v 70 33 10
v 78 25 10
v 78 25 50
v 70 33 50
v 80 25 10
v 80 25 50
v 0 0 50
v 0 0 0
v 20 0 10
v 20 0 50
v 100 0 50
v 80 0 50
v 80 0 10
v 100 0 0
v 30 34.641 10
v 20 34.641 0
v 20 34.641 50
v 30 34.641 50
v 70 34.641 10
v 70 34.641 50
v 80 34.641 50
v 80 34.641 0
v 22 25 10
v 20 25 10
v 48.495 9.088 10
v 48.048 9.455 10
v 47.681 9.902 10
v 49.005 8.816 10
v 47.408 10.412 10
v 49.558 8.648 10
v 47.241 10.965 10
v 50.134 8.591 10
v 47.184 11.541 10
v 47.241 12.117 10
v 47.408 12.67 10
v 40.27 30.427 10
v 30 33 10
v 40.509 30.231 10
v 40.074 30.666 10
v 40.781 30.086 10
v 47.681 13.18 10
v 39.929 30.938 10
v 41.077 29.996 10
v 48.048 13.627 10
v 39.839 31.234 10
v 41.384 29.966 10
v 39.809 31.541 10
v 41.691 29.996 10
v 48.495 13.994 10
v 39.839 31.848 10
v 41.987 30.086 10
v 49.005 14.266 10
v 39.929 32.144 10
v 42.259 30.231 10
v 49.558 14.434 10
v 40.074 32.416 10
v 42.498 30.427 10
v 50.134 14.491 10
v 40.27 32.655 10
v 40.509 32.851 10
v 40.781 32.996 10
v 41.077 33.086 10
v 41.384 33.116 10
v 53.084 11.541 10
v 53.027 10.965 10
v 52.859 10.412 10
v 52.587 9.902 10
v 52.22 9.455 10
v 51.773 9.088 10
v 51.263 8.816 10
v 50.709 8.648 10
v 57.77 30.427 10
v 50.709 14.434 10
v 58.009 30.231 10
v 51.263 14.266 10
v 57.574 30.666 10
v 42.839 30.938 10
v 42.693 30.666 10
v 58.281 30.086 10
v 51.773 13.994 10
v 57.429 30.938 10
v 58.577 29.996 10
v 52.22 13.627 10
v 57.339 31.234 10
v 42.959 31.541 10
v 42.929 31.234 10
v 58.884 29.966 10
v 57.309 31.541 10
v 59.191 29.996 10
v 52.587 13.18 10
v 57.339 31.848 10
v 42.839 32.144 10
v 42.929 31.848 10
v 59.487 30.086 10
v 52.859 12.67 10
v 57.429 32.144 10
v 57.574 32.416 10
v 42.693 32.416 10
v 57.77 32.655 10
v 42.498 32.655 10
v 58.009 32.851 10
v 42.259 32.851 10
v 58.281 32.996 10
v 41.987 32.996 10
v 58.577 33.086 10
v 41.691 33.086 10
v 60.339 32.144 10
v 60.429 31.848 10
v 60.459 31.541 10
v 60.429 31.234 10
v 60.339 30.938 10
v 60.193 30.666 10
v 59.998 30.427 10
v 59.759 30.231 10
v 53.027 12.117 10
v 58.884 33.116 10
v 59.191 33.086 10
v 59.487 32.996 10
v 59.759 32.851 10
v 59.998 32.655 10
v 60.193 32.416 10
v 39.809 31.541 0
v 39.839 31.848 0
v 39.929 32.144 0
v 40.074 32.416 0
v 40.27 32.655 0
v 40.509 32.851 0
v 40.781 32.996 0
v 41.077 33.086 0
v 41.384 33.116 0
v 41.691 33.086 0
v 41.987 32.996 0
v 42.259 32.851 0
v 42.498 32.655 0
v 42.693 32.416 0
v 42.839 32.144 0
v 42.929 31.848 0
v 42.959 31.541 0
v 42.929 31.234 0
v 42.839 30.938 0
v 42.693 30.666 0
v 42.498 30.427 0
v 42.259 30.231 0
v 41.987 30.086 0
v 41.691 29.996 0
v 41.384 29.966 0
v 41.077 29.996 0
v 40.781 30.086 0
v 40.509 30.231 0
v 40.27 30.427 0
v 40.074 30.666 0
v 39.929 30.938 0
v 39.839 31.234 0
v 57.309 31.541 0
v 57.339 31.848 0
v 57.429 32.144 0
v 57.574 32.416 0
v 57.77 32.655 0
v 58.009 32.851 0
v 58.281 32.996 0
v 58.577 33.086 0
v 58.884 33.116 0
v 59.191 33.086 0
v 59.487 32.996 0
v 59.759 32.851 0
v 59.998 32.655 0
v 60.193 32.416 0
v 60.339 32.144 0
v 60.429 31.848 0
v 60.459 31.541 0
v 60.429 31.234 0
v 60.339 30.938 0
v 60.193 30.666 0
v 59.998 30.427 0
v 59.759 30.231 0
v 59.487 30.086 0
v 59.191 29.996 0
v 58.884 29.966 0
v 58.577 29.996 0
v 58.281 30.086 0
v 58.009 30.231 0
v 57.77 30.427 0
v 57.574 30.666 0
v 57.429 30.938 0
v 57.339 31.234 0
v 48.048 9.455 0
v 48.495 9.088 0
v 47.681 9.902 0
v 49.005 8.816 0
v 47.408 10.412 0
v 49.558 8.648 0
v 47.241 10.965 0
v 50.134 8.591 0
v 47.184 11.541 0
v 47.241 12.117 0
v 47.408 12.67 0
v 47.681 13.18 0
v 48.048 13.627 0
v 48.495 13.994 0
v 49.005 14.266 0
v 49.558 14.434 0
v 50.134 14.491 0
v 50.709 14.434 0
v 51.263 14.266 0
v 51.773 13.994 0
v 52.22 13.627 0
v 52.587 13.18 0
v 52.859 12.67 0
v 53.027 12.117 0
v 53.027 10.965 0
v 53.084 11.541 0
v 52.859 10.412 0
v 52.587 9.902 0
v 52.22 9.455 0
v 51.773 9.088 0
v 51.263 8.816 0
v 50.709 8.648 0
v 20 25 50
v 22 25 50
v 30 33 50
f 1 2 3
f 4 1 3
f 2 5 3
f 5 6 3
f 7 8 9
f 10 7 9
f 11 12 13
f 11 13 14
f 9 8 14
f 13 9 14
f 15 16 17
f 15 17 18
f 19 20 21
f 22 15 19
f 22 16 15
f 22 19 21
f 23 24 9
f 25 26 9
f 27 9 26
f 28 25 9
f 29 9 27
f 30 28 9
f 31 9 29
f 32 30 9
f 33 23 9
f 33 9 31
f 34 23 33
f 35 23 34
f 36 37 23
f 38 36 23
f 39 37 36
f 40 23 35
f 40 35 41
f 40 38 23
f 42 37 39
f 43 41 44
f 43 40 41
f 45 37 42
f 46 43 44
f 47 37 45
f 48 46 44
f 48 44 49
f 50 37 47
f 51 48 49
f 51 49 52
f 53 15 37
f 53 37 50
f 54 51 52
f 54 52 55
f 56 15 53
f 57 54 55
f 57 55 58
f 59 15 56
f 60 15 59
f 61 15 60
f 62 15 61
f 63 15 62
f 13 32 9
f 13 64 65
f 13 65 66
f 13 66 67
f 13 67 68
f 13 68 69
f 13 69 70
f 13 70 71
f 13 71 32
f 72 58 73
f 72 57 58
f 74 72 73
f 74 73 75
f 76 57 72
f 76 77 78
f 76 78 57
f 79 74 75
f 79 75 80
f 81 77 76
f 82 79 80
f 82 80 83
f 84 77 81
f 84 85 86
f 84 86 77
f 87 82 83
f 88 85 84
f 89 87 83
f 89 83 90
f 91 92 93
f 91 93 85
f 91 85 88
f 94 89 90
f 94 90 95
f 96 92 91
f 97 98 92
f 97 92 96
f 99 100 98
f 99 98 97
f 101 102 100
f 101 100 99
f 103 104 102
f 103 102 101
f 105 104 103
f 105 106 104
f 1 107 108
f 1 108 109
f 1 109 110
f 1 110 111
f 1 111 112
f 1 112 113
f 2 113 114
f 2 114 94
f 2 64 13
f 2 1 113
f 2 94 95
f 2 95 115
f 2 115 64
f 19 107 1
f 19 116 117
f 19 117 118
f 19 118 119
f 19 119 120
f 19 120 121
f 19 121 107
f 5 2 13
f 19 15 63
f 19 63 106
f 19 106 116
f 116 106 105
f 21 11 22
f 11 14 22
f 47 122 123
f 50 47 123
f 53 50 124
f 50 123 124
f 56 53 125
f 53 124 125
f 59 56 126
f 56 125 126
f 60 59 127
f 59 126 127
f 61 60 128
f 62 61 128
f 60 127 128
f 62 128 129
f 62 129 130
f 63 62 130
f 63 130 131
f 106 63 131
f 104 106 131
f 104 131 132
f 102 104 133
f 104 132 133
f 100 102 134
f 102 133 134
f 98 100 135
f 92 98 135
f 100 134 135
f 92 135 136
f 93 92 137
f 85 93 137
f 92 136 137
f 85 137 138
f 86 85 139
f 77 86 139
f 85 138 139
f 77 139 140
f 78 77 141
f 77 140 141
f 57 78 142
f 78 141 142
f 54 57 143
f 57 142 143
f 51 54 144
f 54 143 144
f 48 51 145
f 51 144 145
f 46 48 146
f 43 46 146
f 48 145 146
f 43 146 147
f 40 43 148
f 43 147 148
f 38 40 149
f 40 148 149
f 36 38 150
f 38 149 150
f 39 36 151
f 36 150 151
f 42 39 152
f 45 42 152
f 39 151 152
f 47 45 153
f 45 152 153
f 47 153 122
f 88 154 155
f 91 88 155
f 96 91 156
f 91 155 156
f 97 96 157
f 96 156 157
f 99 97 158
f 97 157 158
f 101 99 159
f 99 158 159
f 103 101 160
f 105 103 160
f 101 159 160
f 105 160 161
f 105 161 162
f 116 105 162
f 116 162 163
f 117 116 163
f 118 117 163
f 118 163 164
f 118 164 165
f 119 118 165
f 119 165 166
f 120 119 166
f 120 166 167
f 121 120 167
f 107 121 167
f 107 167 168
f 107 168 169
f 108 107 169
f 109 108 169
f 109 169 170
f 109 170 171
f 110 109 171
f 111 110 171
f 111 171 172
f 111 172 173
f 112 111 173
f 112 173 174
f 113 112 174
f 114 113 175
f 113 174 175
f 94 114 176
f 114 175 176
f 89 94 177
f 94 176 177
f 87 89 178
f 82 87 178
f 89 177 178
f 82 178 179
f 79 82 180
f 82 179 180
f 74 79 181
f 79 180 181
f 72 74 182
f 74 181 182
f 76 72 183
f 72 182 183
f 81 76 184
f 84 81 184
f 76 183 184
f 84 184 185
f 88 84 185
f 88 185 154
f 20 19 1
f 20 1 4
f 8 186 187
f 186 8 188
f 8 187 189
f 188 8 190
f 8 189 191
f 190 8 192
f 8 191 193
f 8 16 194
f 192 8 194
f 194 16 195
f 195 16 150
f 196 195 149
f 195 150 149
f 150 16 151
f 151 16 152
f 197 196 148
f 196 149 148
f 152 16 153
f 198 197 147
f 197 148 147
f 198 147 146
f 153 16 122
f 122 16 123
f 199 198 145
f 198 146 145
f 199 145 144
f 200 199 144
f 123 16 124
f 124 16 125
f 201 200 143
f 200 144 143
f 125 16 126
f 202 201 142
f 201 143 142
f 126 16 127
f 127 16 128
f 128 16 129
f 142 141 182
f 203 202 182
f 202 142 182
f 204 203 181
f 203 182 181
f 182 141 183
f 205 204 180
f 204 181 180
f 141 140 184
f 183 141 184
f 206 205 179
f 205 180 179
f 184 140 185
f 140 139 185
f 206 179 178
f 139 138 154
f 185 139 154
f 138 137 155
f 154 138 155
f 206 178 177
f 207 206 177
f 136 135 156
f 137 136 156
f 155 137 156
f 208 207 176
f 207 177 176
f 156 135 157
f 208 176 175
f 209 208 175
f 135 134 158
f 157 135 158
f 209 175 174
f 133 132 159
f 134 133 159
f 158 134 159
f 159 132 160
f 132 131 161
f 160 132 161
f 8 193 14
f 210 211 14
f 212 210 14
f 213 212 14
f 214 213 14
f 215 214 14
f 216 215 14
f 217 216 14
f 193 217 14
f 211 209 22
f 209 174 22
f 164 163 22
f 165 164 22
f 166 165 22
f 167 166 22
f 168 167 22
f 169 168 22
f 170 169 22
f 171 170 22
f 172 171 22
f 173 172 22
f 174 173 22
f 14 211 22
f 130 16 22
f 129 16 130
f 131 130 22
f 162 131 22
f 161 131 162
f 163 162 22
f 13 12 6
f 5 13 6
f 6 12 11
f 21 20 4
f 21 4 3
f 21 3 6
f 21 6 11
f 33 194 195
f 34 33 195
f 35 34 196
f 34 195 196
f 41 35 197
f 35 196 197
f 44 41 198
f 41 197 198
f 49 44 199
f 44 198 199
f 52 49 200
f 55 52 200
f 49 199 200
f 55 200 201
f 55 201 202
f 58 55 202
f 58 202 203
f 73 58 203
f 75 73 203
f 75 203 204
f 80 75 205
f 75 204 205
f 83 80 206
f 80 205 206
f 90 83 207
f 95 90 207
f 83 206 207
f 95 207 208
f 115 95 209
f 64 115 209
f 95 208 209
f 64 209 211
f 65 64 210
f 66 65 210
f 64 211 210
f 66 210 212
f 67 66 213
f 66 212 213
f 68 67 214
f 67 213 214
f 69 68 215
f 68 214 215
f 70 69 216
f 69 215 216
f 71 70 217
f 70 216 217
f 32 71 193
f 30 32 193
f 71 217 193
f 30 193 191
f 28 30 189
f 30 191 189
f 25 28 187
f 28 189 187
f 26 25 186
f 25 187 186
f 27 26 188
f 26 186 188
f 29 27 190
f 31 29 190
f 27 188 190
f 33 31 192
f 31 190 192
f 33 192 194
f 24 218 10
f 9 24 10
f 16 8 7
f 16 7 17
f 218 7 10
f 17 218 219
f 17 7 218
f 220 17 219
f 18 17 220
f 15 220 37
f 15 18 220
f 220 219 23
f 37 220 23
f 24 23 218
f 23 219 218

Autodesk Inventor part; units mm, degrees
ref_plane "YZ Plane" through (0, 0, 0) normal (1, 0, 0) x (0, 1, 0)
ref_plane "XZ Plane" through (0, 0, 0) normal (0, 1, 0) x (-1, 0, 0)
ref_plane "XY Plane" through (0, 0, 0) normal (0, 0, 1) x (1, 0, 0)
sketch "Sketch1" plane through (0, 0, 0) normal (0, 0, 1) x (1, 0, 0)
  line L0 (0, 0) -> (100, 0)
  line L1 (0, 0) -> (20, 34.641)
  line L2 (0, 0) -> (40, 0) construction
  line L3 (100, 0) -> (80, 34.641)
  line L4 (100, 0) -> (140, 0) construction
  line L5 (20, 34.641) -> (80, 34.641)
  dimension "d0" = 100
  dimension "d1" = 40
  dimension "d2" = 60
  dimension "d3" = 40
  dimension "d4" = 120
extrude "Extrusion1" add sketch "Sketch1" along normal blind 30
sketch "Sketch2" plane through (0, 0, 30) normal (0, 0, 1) x (1, 0, 0)
  line L0 (0, 0) -> (100, 0) projected
  line L1 (20, 0) -> (80, 0)
  line L2 (80, 0) -> (80, 25)
  line L3 (80, 25) -> (20, 25)
  line L4 (20, 25) -> (20, 0)
  dimension "d7" = 60
  dimension "d8" = 25
  dimension "d9" = 20
extrude "Extrusion2" cut sketch "Sketch2" against normal blind 20
ref_plane "Work Plane1" through (0, -10, 0) normal (0, -1, 0) x (1, 0, 0)
sketch "Sketch4" plane through (20, 34.641, 0) normal (0, 1, 0) x (1, 0, 0)
  line L0 (60, -10) -> (0, -10) projected
  line L1 (10, -10) -> (50, -10)
  line L2 (50, -10) -> (50, -35)
  line L3 (50, -35) -> (10, -35)
  line L4 (10, -35) -> (10, -10)
  point P0 (-20, 0)
  point P1 (30, -10)
  point P2 (50, -10)
  dimension "d19" = 40
  dimension "d20" = 25
  dimension "d21" = 20
extrude "Extrusion4" cut sketch "Sketch4" against normal through all
chamfer "Chamfer1" distance 8 angle 45 1 edges at (30, 25, 20)
chamfer "Chamfer2" distance 8 angle 45 1 edges at (70, 25, 20)
sketch "Sketch6" plane through (0, 0, 30) normal (0, 0, 1) x (1, 0, 0)
  line L0 (30, 33) -> (22, 25) projected
  line L1 (30, 33) -> (30, 34.641) projected
  line L2 (30, 34.641) -> (20, 34.641) projected
  line L3 (20, 34.641) -> (0, 0) projected
  line L4 (0, 0) -> (20, 0) projected
  line L5 (20, 0) -> (20, 25) projected
  line L6 (20, 25) -> (22, 25) projected
  line L7 (78, 25) -> (70, 33) projected
  line L8 (78, 25) -> (80, 25) projected
  line L9 (80, 25) -> (80, 0) projected
  line L10 (80, 0) -> (100, 0) projected
  line L11 (100, 0) -> (80, 34.641) projected
  line L12 (80, 34.641) -> (70, 34.641) projected
  line L13 (70, 34.641) -> (70, 33) projected
extrude "Extrusion6" add sketch "Sketch6" along normal blind 20
sketch "Sketch8" plane through (0, 0, 0) normal (0, 0, -1) x (-1, 0, 0)
  line L0 (-39.0839, 36.891) -> (-43.0739, 36.891) projected
  line L1 (-43.0739, 48.241) -> (-43.0739, 36.891) projected
  line L2 (-57.1939, 48.241) -> (-43.0739, 48.241) projected
  line L3 (-57.1939, 48.241) -> (-57.1939, 36.891) projected
  line L4 (-57.1939, 36.891) -> (-61.1839, 36.891) projected
  line L5 (-61.1839, 36.891) -> (-61.1839, 5.041) projected
  line L6 (-56.3339, 0.191) -> (-43.9339, 0.191) projected
  line L7 (-39.0839, 5.041) -> (-39.0839, 36.891) projected
  line L8 (-52.9432, 43.5972) -> (-47.3245, 43.5972) projected
  line L9 (-52.9432, 43.5972) -> (-52.9432, 44.1479) projected
  line L10 (-52.4839, 44.6341) -> (-52.9432, 44.1479) projected
  line L11 (-52.4839, 44.6341) -> (-47.7839, 44.6341) projected
  line L12 (-47.3245, 44.1479) -> (-47.7839, 44.6341) projected
  line L13 (-47.3245, 44.1479) -> (-47.3245, 43.5972) projected
  circle A0 centre (-58.8839, 31.541) radius 1.575
  circle A1 centre (-41.3839, 31.541) radius 1.575
  circle A2 centre (-50.1339, 11.541) radius 2.75
  circle A3 centre (-50.1339, 11.541) radius 2.95
  arc A4 (-61.1839, 5.041) -> (-56.3339, 0.191) centre (-56.3339, 5.041) ccw projected
  arc A5 (-43.9339, 0.191) -> (-39.0839, 5.041) centre (-43.9339, 5.041) ccw projected
  circle A6 centre (-50.1339, 11.541) radius 2.75 projected
  circle A7 centre (-41.6839, 2.741) radius 0.75 projected
  circle A8 centre (-58.5839, 2.741) radius 0.75 projected
  circle A9 centre (-40.7939, 35.041) radius 1 projected
  circle A10 centre (-59.4739, 35.041) radius 1 projected
  circle A11 centre (-58.8839, 31.541) radius 1.575 projected
  circle A12 centre (-41.3839, 31.541) radius 1.575 projected
  point P0 (0, 0)
extrude "Extrusion8" cut sketch "Sketch8" against normal up to surface (10 mm away) contours A0 | A1 | A2 | A3
properties part number "Wheel_well"
